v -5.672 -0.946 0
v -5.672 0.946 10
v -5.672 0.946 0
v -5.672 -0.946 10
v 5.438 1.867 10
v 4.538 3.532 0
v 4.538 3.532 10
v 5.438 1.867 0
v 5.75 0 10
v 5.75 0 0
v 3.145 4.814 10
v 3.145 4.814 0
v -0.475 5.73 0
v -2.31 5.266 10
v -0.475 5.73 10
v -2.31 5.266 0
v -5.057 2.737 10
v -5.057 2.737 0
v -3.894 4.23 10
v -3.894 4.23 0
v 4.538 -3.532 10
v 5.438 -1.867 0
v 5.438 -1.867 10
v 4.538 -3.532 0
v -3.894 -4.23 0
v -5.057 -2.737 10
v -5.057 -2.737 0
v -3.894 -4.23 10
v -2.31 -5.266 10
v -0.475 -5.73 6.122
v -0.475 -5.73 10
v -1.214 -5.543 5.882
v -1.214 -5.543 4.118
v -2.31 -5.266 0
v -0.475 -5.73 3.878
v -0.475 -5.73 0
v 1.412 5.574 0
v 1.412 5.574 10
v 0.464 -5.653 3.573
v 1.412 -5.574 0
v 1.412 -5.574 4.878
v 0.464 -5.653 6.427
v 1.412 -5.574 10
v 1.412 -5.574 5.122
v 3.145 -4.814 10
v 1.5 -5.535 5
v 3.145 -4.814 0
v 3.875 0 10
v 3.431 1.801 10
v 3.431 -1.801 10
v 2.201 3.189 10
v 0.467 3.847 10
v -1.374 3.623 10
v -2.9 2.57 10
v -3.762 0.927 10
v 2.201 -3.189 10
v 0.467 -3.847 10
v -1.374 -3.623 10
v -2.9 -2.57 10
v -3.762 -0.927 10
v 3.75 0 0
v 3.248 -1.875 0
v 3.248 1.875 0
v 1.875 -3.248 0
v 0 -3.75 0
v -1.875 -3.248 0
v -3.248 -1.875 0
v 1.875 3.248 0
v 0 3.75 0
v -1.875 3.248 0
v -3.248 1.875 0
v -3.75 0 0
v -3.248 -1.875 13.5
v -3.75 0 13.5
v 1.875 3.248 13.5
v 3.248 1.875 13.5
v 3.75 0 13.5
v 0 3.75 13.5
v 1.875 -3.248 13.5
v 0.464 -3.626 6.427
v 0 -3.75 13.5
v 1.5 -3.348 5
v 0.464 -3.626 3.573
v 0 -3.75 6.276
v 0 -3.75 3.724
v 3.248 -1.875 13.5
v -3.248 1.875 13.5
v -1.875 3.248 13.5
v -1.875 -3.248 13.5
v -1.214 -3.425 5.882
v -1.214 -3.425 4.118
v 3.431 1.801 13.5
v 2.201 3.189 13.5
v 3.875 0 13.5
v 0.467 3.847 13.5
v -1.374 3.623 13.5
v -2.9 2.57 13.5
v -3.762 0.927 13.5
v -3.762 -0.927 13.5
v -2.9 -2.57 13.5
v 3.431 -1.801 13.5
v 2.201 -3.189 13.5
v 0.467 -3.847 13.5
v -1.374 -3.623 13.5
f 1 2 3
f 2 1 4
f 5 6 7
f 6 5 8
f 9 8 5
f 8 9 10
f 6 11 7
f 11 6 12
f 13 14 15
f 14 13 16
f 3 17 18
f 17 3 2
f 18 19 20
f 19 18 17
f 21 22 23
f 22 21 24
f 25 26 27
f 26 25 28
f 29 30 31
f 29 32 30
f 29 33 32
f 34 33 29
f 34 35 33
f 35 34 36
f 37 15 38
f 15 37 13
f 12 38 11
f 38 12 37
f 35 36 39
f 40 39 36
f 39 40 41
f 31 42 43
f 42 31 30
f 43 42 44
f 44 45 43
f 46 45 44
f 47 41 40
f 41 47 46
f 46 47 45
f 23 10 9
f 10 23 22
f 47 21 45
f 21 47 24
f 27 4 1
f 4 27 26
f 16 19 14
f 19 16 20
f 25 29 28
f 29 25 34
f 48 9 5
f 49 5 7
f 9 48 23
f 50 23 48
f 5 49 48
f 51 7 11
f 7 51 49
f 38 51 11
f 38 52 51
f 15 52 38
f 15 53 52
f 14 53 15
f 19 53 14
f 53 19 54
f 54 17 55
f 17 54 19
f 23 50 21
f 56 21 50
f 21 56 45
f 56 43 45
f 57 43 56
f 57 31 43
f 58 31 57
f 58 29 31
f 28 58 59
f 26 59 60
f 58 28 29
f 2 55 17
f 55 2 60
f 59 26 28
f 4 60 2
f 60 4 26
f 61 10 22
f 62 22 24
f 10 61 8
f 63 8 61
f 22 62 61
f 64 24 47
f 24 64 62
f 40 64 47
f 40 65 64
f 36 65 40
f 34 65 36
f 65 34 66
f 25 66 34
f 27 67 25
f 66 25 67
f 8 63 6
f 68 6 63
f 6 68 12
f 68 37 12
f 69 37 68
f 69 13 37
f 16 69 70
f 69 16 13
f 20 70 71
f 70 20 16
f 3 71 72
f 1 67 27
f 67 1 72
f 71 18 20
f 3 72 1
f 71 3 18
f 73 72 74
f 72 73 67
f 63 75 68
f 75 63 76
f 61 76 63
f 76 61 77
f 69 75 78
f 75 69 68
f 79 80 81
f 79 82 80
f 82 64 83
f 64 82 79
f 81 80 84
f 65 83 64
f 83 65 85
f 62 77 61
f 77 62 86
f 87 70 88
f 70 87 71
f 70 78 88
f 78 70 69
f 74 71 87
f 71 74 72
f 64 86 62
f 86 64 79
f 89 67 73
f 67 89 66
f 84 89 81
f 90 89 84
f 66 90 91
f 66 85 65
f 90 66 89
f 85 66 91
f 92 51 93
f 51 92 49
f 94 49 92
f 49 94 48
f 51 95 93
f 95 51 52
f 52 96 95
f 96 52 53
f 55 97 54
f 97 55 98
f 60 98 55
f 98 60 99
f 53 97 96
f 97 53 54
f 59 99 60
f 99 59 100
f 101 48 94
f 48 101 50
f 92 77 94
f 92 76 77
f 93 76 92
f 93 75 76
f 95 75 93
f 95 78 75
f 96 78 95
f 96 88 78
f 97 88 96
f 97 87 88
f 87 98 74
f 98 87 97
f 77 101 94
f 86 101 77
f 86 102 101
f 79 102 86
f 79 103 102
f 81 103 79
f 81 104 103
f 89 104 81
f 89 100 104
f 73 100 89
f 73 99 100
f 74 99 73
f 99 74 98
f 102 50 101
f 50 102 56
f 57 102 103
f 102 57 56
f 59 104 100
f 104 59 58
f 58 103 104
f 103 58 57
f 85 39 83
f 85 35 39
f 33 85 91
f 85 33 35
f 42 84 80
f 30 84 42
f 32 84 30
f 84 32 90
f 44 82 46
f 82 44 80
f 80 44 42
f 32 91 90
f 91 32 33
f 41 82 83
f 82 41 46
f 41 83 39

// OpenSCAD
difference() {
	union() {
		difference() {
			cylinder(d = 11.5000000000, h = 10);
			translate(v = [0, 0, -5.0000000000]) {
				cylinder(d = 7.5000000000, h = 20);
			}
		}
		translate(v = [0, 0, 10]) {
			difference() {
				cylinder(d = 7.7500000000, h = 3.5000000000);
				translate(v = [0, 0, -1.7500000000]) {
					cylinder(d = 7.5000000000, h = 7.0000000000);
				}
			}
		}
	}
	translate(v = [0, 0, 5.0000000000]) {
		rotate(a = [90, 0, 0]) {
			cylinder(d = 3, h = 30);
		}
	}
}
